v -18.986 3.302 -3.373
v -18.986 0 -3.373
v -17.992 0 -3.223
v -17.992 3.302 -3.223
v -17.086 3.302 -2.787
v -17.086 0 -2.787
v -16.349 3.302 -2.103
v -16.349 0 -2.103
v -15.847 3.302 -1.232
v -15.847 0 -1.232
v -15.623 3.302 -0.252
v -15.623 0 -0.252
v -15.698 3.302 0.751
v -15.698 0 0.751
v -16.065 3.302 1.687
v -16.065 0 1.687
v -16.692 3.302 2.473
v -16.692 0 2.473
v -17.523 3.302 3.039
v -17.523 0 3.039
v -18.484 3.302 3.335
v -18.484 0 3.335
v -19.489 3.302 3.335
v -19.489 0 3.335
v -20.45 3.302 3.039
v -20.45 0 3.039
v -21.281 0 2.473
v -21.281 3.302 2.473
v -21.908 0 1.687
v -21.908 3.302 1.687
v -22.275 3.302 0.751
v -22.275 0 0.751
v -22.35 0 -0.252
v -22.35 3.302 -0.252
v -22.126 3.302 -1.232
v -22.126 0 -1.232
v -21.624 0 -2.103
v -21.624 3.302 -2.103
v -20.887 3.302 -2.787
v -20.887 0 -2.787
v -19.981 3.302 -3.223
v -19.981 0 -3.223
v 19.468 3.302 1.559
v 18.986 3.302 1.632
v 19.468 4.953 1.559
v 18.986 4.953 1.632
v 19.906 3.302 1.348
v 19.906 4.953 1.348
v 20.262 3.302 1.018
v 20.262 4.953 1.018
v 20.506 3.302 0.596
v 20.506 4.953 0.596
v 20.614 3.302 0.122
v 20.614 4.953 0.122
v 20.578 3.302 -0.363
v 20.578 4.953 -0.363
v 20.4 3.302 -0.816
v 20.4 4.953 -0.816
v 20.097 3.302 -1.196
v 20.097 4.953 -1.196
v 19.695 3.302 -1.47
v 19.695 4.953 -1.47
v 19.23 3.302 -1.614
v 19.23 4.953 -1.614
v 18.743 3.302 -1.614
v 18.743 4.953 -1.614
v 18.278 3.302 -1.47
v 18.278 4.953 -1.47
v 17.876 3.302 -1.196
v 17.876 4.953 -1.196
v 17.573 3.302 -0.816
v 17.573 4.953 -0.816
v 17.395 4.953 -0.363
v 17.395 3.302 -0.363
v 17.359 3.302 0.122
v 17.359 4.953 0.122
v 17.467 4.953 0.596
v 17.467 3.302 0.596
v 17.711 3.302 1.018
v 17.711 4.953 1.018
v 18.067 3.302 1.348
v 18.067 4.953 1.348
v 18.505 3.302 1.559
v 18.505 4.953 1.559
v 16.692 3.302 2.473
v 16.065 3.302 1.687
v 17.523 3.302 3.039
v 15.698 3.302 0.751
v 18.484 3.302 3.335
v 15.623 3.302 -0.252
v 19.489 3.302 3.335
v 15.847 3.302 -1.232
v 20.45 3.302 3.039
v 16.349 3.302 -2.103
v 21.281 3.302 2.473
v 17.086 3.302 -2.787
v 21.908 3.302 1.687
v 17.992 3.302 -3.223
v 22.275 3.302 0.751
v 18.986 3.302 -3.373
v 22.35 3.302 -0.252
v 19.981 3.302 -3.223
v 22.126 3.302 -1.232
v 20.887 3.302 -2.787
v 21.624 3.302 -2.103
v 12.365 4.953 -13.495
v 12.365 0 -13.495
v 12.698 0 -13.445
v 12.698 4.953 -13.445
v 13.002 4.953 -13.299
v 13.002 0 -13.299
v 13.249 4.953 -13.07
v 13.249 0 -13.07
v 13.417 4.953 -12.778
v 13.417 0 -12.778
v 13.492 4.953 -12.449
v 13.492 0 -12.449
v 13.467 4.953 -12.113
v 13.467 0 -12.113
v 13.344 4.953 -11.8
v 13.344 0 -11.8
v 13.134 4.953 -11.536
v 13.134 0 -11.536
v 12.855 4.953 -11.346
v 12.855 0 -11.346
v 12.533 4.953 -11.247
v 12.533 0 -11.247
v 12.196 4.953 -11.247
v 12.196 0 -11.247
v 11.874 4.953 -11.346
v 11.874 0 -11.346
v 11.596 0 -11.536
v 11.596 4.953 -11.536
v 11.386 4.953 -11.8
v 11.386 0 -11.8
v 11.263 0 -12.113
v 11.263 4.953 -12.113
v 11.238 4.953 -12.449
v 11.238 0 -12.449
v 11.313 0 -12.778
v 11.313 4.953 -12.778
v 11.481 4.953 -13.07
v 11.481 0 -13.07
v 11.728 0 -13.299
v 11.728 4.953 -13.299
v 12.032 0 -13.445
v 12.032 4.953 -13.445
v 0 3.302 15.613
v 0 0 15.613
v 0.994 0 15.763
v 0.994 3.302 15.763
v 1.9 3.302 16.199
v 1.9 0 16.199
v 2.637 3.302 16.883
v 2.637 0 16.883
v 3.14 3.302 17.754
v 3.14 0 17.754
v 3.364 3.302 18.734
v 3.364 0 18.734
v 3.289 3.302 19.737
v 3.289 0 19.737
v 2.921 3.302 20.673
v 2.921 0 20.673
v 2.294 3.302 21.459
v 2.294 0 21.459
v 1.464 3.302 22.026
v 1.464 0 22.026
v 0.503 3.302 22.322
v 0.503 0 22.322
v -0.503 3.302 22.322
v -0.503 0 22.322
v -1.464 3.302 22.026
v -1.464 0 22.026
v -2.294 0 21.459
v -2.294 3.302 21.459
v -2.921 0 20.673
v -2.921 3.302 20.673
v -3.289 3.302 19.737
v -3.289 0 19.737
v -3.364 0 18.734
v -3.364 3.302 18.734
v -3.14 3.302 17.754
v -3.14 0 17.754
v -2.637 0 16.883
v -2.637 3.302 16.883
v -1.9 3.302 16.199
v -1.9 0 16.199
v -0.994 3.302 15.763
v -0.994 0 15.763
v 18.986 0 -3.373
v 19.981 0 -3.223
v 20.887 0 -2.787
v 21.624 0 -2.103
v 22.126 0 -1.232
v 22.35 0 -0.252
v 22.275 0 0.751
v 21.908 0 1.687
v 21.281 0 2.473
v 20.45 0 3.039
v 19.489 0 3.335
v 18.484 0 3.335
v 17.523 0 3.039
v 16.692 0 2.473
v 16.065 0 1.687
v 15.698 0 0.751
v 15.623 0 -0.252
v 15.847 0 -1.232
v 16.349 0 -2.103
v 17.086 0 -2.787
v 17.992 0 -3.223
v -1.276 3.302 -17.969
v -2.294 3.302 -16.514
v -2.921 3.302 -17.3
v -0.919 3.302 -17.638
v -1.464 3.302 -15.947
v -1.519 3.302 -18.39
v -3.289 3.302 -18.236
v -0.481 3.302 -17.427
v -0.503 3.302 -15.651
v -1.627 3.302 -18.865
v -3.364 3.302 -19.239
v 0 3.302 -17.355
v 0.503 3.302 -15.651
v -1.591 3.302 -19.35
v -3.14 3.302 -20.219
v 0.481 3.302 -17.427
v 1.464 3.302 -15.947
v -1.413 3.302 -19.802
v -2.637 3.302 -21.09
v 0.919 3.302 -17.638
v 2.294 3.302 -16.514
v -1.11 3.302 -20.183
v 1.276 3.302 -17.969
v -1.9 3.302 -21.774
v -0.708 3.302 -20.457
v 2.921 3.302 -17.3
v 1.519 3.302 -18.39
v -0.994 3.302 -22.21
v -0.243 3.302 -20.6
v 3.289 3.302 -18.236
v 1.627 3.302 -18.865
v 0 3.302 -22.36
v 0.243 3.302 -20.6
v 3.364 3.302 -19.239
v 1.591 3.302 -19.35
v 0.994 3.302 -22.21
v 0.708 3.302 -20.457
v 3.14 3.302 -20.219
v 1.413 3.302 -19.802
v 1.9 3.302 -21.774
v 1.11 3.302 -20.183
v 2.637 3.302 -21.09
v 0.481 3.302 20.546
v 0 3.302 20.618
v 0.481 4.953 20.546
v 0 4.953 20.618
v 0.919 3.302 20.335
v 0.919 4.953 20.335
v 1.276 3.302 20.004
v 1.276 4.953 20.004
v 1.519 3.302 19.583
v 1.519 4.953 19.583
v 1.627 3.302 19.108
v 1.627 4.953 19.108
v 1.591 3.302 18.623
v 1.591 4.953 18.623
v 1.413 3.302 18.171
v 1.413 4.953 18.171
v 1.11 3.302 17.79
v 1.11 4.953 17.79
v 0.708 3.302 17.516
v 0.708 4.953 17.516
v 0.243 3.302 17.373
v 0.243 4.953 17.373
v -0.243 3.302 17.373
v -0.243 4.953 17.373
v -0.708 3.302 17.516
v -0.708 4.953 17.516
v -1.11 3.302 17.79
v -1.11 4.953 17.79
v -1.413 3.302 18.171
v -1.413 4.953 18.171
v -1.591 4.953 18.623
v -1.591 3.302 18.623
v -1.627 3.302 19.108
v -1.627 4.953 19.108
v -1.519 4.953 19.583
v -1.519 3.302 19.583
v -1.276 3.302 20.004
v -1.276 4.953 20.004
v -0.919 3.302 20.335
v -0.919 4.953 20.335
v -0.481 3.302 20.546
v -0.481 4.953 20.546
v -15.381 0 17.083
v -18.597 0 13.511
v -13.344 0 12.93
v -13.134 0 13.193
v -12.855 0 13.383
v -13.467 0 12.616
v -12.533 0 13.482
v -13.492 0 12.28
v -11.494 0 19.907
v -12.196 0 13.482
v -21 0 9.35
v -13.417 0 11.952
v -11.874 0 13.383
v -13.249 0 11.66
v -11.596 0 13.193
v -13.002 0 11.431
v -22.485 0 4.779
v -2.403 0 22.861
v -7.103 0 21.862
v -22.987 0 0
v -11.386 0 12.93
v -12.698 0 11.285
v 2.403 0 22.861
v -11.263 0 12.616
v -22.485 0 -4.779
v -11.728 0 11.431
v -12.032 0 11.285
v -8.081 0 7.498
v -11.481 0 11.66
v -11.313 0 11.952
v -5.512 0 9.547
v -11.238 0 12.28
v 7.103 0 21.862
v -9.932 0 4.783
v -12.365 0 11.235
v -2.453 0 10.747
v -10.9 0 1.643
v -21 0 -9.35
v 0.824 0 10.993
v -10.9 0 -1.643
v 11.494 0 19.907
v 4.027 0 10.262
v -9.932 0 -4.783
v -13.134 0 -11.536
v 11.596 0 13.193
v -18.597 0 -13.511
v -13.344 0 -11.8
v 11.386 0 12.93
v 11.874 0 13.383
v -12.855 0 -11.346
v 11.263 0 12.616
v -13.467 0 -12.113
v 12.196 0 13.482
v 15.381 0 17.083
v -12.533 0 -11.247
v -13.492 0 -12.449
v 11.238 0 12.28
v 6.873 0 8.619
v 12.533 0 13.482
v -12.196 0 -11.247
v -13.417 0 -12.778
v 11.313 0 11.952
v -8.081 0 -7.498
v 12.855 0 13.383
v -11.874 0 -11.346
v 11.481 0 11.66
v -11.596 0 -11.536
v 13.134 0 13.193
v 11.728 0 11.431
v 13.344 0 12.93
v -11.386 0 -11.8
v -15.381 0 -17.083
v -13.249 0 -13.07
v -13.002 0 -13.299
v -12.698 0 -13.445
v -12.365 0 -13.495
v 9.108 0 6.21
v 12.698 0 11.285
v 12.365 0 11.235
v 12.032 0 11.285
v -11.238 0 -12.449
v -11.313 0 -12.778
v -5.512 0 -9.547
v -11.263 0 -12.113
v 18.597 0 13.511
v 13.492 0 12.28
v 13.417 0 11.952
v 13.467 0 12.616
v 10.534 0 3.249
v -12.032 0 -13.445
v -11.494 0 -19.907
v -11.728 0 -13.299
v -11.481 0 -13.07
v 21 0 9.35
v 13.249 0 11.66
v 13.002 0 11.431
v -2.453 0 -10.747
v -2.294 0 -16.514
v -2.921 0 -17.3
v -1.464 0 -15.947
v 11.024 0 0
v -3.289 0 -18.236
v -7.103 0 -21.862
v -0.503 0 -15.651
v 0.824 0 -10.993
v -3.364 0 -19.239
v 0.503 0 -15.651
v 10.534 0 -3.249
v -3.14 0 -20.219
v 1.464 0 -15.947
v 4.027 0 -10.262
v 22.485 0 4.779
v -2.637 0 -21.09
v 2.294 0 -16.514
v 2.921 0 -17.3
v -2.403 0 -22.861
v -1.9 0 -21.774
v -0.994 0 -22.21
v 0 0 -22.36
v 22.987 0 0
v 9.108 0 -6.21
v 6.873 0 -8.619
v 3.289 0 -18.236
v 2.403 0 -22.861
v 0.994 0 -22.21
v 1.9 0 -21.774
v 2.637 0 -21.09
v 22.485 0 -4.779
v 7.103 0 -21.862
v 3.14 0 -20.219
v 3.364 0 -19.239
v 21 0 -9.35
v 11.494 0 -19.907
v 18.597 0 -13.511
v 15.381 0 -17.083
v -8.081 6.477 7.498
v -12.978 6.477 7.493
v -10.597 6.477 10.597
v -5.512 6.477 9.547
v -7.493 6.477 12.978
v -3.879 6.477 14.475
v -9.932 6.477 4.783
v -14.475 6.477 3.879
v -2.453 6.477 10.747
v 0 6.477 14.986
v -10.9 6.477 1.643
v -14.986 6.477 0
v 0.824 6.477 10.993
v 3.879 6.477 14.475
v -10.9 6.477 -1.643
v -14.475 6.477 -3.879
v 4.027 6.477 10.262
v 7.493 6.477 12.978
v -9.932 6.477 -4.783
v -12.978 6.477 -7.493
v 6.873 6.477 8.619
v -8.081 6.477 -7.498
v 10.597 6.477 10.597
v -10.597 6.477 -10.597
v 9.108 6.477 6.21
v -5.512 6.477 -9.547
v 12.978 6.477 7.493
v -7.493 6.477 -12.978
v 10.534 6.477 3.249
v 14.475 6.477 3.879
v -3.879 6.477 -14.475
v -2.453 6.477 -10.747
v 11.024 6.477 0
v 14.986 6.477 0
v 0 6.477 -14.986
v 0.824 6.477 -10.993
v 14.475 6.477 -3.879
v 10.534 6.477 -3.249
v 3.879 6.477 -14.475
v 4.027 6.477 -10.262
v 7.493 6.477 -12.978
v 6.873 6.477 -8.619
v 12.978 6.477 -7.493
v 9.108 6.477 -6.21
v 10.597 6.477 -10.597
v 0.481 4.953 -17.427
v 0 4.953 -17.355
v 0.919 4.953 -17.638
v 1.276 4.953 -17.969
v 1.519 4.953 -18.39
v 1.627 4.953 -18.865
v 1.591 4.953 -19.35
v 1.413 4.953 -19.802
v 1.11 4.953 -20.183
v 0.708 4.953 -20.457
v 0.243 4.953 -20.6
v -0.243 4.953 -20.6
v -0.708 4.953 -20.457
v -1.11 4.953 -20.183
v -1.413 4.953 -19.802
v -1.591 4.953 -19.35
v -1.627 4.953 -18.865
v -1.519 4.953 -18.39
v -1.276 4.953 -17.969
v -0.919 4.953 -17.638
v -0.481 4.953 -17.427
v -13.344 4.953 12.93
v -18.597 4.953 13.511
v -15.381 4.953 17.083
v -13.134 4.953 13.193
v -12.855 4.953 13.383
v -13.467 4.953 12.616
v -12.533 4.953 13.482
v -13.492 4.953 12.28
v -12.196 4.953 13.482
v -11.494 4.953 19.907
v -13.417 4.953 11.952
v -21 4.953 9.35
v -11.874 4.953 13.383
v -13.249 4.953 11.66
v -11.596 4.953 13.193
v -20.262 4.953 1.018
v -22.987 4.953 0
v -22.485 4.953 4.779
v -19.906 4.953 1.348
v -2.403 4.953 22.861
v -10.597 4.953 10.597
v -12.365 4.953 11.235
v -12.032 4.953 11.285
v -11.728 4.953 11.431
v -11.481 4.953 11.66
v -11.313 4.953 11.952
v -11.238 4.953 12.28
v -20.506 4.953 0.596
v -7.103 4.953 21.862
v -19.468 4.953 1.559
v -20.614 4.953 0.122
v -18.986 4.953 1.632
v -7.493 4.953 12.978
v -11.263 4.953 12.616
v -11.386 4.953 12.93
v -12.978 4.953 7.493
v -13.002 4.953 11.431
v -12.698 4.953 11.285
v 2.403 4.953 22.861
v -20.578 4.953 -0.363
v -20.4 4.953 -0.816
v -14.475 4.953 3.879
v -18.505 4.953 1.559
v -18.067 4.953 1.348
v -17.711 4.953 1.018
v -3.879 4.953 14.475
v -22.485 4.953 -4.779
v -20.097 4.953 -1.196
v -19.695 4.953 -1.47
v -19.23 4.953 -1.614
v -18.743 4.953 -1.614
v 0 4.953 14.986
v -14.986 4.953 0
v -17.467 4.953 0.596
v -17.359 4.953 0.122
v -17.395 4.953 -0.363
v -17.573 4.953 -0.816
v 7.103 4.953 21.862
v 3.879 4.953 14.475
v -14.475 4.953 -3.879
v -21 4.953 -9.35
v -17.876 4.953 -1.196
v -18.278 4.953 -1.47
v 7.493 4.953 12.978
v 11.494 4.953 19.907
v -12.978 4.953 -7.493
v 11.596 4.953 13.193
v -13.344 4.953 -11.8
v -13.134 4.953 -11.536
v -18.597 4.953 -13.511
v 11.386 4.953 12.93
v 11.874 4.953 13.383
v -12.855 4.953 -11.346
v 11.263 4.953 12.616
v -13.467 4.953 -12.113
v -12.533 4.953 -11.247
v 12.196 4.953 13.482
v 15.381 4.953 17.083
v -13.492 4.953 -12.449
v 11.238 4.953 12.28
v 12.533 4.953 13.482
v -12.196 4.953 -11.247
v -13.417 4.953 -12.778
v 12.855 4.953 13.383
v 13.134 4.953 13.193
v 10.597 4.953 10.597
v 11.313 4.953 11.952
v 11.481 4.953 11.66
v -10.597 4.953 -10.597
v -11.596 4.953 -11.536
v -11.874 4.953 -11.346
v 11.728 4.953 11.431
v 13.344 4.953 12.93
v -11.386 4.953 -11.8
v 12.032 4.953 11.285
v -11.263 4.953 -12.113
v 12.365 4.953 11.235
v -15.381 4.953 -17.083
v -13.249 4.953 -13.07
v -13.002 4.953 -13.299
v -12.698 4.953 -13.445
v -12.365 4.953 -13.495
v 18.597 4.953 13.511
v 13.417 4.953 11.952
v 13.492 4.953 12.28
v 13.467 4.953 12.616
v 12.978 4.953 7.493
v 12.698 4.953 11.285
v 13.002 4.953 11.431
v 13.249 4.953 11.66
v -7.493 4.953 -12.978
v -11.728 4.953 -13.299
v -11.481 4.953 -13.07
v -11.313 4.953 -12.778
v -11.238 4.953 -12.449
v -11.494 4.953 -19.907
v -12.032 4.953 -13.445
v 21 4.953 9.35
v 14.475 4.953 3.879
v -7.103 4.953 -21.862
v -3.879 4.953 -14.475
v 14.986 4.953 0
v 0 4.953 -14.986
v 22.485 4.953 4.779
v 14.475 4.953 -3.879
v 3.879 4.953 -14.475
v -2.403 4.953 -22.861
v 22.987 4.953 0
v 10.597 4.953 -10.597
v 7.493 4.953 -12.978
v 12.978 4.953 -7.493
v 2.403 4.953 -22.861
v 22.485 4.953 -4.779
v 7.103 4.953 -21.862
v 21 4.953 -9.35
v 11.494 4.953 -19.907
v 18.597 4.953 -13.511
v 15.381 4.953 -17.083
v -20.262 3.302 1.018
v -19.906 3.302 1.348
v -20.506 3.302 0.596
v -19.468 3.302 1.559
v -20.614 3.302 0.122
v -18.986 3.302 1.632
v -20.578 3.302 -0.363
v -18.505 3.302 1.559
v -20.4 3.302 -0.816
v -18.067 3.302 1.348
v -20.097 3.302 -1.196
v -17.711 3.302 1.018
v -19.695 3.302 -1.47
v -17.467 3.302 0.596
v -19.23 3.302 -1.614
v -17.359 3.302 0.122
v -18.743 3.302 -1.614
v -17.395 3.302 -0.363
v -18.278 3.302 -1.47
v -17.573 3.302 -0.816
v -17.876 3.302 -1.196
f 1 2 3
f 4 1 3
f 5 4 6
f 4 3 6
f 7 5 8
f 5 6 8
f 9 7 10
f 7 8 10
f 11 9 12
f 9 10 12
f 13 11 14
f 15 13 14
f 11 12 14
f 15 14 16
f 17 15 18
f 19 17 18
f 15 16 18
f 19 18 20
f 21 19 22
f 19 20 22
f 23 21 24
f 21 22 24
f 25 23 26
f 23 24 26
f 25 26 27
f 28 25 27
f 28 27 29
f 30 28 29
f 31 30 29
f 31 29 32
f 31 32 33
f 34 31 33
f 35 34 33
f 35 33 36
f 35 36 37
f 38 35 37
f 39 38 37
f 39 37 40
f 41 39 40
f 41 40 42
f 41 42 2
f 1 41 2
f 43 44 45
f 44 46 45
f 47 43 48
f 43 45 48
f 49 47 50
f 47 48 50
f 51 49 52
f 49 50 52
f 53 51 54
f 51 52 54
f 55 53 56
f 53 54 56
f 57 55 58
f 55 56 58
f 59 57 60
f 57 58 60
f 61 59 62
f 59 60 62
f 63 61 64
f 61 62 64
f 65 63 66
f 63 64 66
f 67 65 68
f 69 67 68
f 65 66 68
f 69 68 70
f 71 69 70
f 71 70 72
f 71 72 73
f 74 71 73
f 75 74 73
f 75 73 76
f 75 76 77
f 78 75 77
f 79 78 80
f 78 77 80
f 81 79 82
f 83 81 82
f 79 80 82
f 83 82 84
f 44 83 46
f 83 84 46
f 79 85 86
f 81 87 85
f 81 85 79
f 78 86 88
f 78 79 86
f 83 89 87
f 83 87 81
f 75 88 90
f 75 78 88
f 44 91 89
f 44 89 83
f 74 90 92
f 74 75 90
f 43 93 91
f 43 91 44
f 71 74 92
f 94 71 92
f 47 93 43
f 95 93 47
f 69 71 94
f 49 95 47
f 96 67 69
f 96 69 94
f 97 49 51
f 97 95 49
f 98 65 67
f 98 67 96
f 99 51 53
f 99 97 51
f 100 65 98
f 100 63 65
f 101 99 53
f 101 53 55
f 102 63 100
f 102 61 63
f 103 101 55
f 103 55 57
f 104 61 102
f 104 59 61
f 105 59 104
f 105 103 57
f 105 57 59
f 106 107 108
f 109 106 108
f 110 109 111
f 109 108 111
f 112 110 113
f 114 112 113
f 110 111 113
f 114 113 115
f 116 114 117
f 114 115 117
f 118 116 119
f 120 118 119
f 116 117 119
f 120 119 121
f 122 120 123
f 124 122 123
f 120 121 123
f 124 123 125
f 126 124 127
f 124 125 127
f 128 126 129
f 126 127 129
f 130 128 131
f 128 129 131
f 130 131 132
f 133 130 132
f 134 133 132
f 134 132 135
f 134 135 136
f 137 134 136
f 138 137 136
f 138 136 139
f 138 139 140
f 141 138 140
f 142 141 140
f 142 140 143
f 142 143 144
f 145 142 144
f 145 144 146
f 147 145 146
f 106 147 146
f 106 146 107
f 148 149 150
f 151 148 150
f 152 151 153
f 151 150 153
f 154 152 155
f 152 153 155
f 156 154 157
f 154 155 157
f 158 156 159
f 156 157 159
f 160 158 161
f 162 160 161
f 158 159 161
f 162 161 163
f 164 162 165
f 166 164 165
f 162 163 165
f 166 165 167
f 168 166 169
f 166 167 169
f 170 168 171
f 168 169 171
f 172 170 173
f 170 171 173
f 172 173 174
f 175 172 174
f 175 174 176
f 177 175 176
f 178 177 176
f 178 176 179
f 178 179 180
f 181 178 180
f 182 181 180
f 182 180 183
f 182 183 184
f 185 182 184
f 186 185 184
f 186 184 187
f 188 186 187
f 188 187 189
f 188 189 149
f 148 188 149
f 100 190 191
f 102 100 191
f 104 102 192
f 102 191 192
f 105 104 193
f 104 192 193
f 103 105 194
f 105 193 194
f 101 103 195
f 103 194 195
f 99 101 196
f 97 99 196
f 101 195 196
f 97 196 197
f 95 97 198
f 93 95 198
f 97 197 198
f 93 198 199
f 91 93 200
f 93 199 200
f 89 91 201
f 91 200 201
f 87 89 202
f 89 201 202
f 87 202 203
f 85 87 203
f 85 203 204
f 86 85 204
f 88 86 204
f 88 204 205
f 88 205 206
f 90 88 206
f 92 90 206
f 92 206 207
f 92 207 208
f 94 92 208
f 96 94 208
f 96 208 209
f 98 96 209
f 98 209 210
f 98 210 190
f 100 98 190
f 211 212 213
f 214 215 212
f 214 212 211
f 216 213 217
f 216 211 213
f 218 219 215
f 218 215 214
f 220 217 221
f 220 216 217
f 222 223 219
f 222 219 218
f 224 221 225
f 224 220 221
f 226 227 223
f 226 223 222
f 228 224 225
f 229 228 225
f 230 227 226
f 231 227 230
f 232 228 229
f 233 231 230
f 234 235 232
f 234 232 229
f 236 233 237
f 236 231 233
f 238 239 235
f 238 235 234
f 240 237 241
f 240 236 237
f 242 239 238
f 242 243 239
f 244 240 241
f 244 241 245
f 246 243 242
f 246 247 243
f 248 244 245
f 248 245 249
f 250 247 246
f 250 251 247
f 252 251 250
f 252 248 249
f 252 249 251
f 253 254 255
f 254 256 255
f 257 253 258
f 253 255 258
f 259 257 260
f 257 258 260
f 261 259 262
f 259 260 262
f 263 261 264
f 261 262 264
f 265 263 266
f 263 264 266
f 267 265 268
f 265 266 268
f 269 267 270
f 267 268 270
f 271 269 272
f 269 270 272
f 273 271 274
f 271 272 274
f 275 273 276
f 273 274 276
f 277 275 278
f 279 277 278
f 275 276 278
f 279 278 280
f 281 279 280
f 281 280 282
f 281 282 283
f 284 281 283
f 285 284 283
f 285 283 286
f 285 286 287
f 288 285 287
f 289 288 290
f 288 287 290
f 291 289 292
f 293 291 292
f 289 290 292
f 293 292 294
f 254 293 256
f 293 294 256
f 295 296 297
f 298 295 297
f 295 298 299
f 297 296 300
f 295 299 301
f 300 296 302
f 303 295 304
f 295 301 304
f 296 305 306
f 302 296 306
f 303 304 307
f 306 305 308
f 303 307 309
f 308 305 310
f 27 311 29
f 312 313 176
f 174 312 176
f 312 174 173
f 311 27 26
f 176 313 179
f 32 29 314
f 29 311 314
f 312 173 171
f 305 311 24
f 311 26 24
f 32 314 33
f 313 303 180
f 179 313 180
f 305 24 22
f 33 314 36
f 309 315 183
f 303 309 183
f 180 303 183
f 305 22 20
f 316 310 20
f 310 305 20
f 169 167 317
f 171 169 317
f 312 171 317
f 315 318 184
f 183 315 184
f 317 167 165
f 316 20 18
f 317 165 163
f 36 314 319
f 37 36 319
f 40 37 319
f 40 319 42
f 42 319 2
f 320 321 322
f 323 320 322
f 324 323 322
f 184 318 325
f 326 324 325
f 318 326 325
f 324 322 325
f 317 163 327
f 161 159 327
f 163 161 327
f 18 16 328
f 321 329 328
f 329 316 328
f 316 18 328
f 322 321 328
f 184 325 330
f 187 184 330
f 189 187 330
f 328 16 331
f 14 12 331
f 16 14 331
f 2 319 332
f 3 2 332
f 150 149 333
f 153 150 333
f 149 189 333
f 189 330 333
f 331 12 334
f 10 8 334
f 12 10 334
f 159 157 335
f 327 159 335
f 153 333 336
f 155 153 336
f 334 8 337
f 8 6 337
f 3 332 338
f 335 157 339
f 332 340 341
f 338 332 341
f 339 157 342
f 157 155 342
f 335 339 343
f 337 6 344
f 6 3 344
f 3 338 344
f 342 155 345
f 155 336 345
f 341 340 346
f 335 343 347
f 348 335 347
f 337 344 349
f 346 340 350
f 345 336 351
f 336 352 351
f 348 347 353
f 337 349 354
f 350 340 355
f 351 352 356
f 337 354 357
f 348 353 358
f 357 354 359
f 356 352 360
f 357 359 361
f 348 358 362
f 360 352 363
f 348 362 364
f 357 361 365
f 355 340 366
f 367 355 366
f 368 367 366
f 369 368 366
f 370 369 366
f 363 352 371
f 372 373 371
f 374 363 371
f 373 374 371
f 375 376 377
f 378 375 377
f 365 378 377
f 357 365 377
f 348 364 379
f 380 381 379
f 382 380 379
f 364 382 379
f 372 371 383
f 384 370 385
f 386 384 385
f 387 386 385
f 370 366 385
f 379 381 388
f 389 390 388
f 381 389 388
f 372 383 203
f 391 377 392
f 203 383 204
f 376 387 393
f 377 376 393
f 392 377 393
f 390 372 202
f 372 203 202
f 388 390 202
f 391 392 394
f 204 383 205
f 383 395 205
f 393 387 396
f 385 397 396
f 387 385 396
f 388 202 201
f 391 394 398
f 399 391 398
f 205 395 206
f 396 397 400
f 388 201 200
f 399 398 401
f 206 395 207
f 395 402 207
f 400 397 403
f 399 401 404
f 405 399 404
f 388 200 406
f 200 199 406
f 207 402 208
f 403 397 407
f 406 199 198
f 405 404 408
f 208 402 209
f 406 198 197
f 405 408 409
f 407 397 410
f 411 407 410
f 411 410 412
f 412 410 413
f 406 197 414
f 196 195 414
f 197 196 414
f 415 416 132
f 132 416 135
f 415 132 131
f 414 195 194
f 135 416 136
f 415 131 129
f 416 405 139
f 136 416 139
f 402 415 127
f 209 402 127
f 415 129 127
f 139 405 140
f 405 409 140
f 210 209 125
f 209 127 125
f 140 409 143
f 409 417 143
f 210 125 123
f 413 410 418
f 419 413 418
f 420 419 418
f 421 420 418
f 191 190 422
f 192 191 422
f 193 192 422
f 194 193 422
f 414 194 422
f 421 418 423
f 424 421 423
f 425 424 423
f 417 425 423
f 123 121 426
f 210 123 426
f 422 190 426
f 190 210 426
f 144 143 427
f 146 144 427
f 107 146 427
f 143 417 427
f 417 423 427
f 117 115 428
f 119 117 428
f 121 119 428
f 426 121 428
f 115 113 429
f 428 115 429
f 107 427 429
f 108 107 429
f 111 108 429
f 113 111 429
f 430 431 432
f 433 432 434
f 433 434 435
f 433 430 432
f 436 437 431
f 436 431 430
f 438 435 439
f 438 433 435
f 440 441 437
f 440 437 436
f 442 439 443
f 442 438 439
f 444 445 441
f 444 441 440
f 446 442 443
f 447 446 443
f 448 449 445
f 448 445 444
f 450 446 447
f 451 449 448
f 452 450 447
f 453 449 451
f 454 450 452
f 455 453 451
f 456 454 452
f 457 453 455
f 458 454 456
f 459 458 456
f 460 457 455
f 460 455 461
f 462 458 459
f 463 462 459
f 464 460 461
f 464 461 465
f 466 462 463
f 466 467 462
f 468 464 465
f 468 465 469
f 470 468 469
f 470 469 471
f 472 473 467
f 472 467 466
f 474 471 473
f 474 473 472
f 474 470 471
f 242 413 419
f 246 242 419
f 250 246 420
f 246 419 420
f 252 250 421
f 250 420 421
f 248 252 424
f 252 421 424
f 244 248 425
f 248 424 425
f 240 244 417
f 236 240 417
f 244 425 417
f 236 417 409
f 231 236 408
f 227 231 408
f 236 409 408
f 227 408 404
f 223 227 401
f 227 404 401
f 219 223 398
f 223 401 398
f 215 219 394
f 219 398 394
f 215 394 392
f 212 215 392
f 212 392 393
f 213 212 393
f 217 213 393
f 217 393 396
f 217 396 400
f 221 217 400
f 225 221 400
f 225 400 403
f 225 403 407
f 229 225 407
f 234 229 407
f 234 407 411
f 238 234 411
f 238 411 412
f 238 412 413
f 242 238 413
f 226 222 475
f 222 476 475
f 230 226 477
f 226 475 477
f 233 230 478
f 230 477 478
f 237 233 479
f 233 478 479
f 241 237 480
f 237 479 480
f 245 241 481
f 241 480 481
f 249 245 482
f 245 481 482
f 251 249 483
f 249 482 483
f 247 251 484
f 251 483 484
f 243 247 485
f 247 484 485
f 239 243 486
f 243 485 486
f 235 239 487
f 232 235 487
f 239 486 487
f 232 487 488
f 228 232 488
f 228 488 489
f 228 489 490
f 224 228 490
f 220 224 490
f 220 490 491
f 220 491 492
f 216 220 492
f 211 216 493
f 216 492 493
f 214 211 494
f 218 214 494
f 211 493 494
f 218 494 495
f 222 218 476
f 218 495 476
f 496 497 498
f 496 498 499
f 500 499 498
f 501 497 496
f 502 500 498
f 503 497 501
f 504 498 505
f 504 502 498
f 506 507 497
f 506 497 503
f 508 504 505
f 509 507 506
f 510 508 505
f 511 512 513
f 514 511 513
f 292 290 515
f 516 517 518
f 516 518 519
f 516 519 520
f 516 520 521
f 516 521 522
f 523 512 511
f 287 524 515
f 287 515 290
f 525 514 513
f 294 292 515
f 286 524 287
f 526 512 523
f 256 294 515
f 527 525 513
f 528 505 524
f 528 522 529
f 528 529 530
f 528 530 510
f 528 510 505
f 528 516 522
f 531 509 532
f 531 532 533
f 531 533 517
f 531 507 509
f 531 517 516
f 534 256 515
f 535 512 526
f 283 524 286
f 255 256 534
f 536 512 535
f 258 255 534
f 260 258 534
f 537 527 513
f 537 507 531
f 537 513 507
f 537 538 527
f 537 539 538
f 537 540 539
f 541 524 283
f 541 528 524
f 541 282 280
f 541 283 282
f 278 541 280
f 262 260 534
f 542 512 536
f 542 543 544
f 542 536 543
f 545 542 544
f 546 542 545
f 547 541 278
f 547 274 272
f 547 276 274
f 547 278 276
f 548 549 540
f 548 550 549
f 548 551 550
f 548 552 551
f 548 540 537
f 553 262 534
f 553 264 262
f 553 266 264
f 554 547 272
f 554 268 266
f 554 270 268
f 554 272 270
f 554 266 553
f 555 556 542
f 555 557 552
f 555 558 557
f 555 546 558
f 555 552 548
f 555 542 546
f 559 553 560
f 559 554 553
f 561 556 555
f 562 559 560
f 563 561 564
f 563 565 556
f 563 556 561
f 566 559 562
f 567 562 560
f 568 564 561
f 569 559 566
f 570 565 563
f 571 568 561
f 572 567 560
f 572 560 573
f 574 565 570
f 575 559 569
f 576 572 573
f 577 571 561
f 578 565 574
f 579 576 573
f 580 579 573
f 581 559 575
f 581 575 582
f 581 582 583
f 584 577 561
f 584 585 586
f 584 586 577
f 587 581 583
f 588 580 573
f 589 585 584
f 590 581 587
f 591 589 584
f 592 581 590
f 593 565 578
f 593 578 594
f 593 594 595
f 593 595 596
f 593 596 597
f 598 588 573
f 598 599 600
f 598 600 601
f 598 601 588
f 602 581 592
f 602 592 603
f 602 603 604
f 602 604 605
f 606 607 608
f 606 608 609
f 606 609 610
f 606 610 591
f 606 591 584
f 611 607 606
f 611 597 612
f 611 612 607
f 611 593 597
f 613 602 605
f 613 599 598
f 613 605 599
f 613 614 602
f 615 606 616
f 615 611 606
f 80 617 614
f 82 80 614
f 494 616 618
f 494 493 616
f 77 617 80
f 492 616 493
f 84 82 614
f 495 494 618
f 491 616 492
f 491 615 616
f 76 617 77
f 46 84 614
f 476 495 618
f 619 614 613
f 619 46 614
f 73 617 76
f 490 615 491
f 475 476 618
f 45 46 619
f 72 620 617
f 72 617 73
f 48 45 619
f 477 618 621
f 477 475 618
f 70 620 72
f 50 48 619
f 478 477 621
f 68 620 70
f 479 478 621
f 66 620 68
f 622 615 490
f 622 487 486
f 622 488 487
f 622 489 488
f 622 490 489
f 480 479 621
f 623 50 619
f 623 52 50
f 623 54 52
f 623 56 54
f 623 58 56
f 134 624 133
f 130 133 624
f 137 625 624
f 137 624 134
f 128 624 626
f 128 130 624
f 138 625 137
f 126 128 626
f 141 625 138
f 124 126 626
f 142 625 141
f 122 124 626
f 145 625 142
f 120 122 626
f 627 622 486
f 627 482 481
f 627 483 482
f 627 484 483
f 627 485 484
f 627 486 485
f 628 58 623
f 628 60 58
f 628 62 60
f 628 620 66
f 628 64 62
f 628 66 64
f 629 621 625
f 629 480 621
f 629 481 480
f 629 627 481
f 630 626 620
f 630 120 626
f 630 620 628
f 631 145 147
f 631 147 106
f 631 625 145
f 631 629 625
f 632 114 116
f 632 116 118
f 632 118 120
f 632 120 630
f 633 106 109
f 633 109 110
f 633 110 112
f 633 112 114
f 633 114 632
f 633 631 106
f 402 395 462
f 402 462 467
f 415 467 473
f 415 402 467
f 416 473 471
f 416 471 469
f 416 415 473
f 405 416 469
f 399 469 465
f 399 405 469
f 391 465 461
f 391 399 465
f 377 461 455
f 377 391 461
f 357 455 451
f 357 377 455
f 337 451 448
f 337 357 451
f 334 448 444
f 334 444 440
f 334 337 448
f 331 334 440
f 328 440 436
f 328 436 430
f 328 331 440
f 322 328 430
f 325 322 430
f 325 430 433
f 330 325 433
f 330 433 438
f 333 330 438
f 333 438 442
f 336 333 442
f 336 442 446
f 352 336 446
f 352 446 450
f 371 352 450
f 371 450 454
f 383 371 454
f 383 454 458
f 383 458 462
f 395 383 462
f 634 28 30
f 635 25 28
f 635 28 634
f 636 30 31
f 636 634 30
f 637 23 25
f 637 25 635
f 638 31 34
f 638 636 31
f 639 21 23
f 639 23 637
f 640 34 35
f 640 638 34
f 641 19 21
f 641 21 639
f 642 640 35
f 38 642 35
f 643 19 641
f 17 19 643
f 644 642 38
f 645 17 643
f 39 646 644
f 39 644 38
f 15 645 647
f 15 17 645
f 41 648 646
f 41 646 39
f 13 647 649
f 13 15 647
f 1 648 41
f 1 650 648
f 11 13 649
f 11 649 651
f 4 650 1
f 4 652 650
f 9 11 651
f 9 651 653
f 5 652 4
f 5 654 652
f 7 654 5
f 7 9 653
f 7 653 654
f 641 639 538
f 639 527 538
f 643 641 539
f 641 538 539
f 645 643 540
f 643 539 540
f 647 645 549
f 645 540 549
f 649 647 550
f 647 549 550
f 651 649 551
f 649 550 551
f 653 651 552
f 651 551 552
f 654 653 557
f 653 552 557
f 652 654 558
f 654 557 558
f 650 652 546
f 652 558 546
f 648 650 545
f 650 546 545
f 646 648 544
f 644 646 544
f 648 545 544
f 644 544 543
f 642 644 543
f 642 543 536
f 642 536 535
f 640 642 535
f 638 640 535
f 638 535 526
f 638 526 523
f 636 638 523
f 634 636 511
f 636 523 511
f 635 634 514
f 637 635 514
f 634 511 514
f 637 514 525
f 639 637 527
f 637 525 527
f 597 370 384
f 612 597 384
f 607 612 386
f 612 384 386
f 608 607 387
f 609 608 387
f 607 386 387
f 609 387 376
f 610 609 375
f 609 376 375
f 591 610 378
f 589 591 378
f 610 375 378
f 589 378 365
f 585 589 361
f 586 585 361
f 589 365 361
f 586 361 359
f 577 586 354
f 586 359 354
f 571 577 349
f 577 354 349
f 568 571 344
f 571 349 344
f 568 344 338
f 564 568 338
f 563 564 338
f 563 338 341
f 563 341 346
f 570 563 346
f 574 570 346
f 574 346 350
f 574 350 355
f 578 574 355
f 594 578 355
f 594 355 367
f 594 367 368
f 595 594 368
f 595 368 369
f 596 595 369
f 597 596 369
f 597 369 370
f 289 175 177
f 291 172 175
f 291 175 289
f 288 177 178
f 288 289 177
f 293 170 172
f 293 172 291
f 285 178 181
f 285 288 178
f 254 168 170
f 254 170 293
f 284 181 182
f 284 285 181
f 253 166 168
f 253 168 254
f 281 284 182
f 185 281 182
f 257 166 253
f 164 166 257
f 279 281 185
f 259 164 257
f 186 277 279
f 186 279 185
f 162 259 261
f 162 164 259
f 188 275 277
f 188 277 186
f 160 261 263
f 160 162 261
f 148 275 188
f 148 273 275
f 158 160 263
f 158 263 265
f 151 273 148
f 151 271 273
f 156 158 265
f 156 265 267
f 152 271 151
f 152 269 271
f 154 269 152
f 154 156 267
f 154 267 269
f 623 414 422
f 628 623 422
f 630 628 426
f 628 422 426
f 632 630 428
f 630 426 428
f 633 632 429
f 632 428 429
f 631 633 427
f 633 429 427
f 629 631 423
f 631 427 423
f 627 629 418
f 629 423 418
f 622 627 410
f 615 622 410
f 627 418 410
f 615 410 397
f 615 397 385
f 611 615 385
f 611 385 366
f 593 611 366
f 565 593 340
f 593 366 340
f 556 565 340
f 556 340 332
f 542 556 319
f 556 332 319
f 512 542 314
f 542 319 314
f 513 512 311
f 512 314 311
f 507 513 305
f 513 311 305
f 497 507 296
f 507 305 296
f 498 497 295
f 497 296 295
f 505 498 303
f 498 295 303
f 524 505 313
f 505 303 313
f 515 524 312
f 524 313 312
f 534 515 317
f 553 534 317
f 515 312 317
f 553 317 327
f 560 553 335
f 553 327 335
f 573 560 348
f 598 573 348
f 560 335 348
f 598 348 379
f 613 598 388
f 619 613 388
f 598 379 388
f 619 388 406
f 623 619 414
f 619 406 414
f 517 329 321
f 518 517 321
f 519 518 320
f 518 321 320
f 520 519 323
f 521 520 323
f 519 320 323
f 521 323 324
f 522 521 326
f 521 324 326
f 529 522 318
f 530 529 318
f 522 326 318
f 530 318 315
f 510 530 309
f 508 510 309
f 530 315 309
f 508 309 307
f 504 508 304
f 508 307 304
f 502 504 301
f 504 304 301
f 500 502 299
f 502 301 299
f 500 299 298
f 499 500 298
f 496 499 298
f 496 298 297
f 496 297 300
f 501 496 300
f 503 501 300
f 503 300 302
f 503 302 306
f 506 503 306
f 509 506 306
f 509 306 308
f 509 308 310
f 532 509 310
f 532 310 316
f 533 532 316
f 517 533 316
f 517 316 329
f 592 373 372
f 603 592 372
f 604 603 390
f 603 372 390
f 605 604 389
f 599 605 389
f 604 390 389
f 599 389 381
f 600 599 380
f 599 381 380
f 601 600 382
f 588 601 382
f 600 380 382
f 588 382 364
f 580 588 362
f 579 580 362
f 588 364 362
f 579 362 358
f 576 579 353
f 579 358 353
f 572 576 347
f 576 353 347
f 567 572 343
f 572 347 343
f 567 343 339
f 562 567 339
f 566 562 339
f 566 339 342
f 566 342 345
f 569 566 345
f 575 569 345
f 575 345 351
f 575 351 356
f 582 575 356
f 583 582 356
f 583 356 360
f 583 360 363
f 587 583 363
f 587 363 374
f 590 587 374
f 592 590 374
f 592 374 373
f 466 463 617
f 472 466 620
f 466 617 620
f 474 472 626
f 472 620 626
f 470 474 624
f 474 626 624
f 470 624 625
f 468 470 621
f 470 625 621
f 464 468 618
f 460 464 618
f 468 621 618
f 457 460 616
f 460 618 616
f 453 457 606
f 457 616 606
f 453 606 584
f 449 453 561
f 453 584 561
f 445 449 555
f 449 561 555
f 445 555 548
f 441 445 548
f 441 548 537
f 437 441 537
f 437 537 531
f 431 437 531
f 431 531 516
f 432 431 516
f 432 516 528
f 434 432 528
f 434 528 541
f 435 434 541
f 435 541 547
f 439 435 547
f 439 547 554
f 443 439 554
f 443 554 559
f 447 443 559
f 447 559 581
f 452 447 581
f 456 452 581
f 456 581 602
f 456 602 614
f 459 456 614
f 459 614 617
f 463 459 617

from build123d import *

# Parameters (mm, degrees)
SKETCH1_R                                           = 22.987
SKETCH1_R_2                                         = 11.0236
BOSS_EXTRUDE1_DEPTH                                 = 4.953
SKETCH1_3_R                                         = 14.986
SKETCH1_3_R_2                                       = 11.0236
BOSS_EXTRUDE2_DEPTH                                 = 6.477
F_4_40_TAPPED_HOLE1_D                               = 2.2606
CBORE_FOR_4_BINDING_HEAD_MACHINE_SCREW1_D           = 3.2639
CBORE_FOR_4_BINDING_HEAD_MACHINE_SCREW1_CBORE_D     = 6.74624
CBORE_FOR_4_BINDING_HEAD_MACHINE_SCREW1_CBORE_DEPTH = 3.302


with BuildPart() as part:
    # Sketch1 → Boss-Extrude1 (new body)
    with BuildSketch(Plane(origin=(0, 0, 0), x_dir=(1, 0, 0), z_dir=(0, 1, 0))):
        Circle(SKETCH1_R)
        Circle(SKETCH1_R_2, mode=Mode.SUBTRACT)
    extrude(amount=BOSS_EXTRUDE1_DEPTH)

    # Sketch1<3> → Boss-Extrude2 (add)
    with BuildSketch(Plane(origin=(0, 0, 0), x_dir=(1, 0, 0), z_dir=(0, 1, 0))):
        Circle(SKETCH1_3_R)
        Circle(SKETCH1_3_R_2, mode=Mode.SUBTRACT)
    extrude(amount=BOSS_EXTRUDE2_DEPTH)

    # #4-40 Tapped Hole1 (through all)
    with Locations(Plane(origin=(-12.364822729, 4.953, -12.364822729), x_dir=(0, 0, 1), z_dir=(0, 1, 0))):
        with Locations((0, 0), (0, 24.729645458), (24.729645458, 24.729645458), (24.729645458, 0)):
            Hole(F_4_40_TAPPED_HOLE1_D / 2)

    # CBORE for #4 Binding Head Machine Screw1 (through all)
    with Locations(Plane(origin=(0, 0, -18.9865), x_dir=(0, 0, -1), z_dir=(0, -1, 0))):
        with Locations((0, 0), (-18.9865, -18.9865), (-37.973, 0), (-18.9865, 18.9865)):
            CounterBoreHole(CBORE_FOR_4_BINDING_HEAD_MACHINE_SCREW1_D / 2, CBORE_FOR_4_BINDING_HEAD_MACHINE_SCREW1_CBORE_D / 2, CBORE_FOR_4_BINDING_HEAD_MACHINE_SCREW1_CBORE_DEPTH)


solid = part.part
